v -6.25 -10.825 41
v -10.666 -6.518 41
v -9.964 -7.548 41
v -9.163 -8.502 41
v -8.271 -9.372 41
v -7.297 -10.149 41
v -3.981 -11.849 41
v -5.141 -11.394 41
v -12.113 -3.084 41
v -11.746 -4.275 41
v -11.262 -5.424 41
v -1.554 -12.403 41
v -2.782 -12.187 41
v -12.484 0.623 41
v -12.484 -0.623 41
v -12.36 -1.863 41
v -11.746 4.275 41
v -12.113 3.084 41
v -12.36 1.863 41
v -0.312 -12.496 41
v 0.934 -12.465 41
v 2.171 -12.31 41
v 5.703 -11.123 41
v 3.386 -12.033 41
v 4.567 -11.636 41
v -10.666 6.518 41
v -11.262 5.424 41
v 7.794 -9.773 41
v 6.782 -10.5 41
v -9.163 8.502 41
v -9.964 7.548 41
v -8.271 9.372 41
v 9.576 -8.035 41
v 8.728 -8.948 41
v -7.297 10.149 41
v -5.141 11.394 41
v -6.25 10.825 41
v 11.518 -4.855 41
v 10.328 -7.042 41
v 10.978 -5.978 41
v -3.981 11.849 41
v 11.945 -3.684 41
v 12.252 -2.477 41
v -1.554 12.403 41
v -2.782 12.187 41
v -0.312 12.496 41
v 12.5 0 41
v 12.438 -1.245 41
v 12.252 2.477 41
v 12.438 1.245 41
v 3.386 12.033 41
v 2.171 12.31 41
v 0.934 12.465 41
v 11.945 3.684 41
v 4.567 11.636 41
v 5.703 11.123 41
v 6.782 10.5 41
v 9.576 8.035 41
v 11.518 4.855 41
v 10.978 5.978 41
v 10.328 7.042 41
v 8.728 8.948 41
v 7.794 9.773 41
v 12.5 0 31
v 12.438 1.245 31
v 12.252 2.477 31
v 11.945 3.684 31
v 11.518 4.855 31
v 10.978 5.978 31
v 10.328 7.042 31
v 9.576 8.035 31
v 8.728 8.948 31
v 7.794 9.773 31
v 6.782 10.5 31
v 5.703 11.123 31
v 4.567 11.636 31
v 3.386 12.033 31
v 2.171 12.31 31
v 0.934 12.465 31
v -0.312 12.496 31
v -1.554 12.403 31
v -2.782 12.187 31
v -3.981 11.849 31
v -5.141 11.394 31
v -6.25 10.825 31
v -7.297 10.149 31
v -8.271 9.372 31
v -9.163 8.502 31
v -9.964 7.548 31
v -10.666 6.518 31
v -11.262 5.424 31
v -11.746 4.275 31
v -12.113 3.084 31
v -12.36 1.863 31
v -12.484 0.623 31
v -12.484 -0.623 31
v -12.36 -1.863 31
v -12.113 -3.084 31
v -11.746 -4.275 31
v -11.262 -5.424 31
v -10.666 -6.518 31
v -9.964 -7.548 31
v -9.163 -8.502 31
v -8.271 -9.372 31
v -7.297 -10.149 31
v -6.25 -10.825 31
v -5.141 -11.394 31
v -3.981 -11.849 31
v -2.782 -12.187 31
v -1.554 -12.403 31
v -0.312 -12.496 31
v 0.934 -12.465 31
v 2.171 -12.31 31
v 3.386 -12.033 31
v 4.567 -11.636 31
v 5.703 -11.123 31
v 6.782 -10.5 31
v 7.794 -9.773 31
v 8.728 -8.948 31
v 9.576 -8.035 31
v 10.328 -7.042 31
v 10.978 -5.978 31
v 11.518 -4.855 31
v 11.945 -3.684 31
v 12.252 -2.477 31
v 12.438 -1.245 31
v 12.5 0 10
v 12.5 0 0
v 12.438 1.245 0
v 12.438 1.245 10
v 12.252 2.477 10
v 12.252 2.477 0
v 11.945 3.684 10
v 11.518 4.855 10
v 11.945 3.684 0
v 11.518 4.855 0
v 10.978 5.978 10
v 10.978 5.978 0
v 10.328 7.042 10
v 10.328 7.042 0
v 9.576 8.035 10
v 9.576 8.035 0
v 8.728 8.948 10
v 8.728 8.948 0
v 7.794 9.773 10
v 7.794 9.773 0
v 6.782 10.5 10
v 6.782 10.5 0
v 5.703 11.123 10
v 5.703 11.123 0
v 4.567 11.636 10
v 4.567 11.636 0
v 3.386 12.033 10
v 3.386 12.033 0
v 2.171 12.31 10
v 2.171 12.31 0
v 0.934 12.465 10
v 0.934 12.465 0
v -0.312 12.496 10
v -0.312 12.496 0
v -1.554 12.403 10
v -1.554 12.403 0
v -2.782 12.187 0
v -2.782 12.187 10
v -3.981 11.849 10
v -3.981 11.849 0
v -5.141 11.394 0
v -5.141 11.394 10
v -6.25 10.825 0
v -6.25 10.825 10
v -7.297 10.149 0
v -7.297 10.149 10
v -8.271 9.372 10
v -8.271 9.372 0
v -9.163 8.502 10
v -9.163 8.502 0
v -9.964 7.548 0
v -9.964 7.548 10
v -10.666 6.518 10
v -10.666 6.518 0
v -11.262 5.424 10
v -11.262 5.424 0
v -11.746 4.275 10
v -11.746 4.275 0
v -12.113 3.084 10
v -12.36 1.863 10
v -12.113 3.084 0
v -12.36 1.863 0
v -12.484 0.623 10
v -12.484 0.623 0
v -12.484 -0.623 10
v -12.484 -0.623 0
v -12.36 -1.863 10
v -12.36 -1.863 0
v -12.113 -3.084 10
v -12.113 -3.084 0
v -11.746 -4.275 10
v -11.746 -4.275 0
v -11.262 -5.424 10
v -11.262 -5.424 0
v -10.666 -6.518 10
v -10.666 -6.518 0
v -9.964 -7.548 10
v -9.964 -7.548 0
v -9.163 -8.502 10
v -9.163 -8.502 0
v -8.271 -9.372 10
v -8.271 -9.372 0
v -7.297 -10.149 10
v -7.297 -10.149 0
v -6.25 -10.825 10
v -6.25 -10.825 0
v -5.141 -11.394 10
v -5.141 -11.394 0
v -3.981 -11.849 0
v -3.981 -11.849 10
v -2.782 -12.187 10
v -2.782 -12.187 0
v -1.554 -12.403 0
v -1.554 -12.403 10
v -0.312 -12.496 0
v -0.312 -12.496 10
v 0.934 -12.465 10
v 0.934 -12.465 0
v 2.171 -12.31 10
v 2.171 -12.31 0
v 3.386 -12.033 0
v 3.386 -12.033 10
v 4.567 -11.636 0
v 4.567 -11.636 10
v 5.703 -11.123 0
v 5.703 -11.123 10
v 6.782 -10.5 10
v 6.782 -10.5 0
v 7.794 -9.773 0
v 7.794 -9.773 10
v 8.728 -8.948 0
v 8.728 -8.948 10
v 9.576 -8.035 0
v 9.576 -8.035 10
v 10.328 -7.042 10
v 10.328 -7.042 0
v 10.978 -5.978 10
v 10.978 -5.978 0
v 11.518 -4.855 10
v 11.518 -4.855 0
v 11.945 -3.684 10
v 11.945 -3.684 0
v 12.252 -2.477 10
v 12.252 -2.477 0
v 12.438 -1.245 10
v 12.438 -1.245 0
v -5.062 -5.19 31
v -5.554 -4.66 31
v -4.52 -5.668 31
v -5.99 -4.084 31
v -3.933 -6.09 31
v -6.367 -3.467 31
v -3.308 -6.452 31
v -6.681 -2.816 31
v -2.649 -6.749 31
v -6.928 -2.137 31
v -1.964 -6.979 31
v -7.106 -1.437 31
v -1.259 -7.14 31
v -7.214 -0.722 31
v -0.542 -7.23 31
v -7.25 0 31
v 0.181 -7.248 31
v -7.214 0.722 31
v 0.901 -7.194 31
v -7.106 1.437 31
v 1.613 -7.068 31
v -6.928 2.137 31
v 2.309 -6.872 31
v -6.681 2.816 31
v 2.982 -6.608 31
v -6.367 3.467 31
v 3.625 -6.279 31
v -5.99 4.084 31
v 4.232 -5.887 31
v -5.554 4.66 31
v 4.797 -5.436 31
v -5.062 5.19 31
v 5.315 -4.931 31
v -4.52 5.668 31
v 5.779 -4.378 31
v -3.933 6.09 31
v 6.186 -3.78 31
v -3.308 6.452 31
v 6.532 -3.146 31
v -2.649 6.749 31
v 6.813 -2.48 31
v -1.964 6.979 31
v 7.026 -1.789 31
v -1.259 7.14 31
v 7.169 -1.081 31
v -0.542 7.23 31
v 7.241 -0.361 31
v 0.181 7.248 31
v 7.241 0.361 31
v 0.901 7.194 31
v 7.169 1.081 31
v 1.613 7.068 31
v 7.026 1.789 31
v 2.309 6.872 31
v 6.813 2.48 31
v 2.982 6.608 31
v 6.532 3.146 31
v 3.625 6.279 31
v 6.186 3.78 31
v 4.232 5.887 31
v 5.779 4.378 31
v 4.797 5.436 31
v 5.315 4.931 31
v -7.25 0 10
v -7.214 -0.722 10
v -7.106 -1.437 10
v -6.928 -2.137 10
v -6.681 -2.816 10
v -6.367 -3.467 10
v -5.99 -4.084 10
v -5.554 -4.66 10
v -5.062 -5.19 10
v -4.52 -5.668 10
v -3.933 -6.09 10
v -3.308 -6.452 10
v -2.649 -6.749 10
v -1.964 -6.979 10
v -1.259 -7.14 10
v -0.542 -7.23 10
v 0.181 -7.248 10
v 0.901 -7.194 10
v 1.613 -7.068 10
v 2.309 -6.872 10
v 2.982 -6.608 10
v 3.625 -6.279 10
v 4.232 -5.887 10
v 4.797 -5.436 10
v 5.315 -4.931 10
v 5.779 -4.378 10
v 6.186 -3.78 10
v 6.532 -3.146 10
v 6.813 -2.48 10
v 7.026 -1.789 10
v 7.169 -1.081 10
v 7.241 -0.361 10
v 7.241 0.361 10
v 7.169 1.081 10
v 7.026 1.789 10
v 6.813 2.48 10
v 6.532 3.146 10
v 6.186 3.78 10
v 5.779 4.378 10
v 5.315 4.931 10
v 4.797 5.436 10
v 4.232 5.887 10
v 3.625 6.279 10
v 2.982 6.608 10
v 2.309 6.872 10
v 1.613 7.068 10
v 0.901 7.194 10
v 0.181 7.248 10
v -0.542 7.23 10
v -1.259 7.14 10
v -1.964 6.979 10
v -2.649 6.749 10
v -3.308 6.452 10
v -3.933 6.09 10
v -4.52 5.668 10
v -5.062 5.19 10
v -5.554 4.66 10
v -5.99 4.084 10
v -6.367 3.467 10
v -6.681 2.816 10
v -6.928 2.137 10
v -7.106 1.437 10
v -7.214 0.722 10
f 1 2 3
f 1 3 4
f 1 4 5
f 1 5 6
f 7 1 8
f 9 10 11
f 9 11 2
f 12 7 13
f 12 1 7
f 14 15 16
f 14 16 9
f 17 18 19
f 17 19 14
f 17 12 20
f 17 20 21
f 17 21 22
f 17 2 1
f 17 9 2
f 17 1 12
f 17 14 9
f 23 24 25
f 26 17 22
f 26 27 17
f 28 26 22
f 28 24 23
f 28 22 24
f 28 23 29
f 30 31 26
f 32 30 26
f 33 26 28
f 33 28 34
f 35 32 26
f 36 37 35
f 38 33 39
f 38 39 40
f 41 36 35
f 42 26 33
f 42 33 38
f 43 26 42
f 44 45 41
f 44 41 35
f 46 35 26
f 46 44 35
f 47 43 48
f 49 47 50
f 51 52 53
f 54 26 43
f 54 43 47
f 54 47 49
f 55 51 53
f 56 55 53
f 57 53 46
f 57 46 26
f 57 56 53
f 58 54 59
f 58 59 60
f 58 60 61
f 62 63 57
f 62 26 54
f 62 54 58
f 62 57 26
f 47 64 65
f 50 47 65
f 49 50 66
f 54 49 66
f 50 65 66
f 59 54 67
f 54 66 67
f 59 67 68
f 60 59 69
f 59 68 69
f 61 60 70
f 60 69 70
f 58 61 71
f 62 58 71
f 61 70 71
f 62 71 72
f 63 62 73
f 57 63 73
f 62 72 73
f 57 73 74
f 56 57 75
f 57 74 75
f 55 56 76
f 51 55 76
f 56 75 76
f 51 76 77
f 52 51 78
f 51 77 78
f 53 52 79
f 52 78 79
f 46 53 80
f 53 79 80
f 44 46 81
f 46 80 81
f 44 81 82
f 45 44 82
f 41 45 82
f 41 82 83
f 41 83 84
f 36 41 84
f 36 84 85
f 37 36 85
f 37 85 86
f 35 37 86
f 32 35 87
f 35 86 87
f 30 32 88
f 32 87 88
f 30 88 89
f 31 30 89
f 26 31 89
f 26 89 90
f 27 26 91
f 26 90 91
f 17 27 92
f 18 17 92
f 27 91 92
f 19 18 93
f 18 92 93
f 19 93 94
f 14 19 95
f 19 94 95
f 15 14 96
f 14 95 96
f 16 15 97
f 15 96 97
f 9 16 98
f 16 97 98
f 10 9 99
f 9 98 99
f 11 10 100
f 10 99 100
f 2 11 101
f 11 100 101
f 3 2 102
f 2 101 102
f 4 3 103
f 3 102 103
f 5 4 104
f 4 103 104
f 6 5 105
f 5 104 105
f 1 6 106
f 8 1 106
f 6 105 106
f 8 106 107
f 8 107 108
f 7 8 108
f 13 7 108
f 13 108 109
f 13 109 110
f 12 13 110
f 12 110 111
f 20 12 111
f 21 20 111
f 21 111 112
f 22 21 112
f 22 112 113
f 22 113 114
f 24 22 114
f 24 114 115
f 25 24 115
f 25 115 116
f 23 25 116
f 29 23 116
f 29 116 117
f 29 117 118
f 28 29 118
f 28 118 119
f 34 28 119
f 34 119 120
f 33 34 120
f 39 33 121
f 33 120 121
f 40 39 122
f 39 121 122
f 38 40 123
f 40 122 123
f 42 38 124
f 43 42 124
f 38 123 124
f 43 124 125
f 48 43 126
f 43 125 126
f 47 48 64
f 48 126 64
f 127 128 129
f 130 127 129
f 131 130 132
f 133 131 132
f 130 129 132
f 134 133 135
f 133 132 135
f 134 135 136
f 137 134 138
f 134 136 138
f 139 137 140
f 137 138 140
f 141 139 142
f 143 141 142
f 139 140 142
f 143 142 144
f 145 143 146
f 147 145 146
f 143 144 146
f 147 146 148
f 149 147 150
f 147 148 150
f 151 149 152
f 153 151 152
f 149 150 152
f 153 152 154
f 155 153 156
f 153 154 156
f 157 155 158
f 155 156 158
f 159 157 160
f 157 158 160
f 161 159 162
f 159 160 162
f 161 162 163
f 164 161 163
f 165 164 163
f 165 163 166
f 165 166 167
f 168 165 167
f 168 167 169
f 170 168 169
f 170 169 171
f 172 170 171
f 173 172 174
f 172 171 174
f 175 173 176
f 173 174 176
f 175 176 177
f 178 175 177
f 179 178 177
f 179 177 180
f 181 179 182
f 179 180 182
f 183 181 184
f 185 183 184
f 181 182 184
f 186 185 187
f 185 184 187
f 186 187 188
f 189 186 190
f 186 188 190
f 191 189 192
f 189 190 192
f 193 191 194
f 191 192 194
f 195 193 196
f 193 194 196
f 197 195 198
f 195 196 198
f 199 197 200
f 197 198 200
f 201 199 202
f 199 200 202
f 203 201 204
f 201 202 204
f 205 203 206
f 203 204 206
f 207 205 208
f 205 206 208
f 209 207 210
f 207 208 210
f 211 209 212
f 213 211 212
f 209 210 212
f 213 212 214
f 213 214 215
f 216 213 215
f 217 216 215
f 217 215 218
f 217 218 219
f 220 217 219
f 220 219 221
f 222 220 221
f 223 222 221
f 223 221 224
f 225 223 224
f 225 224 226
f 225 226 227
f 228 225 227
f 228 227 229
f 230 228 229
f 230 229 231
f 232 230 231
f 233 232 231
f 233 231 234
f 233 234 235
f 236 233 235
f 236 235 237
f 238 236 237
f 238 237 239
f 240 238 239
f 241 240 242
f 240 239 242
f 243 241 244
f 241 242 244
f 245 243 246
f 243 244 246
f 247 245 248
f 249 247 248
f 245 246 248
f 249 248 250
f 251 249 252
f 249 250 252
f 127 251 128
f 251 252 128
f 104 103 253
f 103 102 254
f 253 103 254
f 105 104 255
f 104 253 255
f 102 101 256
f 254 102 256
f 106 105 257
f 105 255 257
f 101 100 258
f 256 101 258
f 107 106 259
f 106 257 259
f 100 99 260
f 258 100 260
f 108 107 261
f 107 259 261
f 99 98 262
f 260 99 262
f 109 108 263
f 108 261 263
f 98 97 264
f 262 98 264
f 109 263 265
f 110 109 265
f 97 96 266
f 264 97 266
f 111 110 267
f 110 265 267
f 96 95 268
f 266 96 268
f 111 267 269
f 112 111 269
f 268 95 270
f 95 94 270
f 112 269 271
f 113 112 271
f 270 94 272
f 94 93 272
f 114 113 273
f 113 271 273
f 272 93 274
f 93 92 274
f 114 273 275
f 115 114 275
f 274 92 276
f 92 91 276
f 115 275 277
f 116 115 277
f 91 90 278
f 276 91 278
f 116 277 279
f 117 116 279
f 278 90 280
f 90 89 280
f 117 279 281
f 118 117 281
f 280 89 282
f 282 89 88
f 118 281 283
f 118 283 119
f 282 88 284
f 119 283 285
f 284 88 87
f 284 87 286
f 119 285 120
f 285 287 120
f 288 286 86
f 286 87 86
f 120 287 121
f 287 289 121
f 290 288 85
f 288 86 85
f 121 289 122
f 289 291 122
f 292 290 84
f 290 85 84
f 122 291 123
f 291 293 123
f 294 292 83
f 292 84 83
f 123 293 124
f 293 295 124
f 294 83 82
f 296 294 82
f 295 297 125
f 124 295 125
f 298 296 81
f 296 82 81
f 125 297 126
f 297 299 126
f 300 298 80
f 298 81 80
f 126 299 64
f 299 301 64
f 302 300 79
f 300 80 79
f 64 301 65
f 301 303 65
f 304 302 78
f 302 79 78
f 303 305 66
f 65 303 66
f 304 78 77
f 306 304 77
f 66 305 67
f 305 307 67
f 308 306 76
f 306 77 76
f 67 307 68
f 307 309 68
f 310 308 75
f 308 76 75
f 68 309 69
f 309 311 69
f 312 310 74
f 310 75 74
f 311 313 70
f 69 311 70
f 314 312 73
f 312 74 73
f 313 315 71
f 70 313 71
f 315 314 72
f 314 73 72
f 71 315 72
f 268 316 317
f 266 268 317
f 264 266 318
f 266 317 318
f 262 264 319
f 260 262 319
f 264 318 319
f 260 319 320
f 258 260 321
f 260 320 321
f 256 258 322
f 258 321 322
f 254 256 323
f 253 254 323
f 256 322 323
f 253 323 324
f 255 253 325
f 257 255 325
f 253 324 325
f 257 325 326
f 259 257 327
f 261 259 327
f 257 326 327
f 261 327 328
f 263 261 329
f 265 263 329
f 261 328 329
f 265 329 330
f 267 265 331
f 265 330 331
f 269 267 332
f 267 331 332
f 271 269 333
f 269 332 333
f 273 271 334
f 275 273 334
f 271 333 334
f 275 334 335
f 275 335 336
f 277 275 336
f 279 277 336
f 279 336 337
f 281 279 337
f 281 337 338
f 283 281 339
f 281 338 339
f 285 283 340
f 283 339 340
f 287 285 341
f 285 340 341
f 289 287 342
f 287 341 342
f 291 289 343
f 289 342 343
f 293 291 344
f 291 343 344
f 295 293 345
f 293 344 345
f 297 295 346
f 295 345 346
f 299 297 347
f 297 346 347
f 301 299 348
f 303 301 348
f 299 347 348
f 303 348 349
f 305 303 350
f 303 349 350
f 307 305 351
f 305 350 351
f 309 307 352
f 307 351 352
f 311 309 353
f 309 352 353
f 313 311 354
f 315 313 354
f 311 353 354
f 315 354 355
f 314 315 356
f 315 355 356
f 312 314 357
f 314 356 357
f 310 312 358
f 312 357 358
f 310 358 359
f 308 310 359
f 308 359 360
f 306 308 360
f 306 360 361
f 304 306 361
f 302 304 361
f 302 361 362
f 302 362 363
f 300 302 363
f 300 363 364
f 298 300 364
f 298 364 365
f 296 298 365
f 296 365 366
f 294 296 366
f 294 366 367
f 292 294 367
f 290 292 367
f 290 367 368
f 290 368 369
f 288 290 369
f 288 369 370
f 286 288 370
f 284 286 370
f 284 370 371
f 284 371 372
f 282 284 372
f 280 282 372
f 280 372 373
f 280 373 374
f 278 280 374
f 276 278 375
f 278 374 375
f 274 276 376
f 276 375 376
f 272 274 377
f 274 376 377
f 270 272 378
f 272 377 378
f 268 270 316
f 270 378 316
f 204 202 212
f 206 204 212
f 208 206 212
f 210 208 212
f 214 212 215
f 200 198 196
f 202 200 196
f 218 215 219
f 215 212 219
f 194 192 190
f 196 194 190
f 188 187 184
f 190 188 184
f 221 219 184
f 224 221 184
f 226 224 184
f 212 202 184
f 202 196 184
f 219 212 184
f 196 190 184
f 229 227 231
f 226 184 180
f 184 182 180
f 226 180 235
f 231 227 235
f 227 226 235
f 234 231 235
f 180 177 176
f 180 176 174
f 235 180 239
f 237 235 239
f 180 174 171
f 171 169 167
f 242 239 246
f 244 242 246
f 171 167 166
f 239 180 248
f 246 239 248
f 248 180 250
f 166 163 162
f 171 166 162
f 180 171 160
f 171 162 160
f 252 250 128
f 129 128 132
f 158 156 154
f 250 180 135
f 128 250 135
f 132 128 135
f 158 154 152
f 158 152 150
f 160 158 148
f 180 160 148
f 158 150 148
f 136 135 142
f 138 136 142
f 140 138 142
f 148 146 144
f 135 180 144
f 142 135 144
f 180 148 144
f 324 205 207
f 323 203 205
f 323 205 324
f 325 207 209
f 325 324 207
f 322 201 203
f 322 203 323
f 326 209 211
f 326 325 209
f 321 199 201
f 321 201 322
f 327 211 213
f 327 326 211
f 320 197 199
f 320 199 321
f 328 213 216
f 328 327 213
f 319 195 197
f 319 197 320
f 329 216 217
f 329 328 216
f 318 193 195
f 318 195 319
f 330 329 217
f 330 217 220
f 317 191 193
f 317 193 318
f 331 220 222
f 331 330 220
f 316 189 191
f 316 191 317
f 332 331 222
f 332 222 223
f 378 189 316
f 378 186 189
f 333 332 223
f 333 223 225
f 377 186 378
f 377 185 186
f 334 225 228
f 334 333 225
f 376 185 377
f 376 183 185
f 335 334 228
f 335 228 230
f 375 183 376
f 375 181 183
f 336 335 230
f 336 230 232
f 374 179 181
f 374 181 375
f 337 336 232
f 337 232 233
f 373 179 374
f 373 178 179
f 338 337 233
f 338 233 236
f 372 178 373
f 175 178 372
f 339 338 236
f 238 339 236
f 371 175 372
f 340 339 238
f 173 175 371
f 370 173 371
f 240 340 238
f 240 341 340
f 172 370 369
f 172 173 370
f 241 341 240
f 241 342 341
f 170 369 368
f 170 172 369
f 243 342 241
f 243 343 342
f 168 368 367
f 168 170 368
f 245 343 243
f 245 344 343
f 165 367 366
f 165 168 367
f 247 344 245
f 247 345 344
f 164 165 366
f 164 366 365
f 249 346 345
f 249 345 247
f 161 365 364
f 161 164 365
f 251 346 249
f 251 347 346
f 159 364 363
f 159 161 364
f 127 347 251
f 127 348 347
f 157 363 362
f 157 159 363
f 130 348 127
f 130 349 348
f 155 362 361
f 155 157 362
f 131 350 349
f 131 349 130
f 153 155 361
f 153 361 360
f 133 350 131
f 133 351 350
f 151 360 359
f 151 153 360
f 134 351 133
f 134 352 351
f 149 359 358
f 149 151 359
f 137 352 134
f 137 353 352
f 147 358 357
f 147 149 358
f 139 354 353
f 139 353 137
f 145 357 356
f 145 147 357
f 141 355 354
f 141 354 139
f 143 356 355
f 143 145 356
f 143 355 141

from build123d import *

# Parameters (mm, degrees)
SKETCH1_R           = 12.5
BOSS_EXTRUDE1_DEPTH = 10
SKETCH3_R           = 7.25
BOSS_EXTRUDE2_DEPTH = 21
SKETCH4_R           = 12.5
BOSS_EXTRUDE3_DEPTH = 10


with BuildPart() as part:
    # Sketch1 → Boss-Extrude1 (new body)
    with BuildSketch(Plane.XY):
        Circle(SKETCH1_R)
    extrude(amount=BOSS_EXTRUDE1_DEPTH)

    # Sketch3 → Boss-Extrude2 (add)
    with BuildSketch(Plane.XY.offset(10)):
        with Locations(Location((0, 0, 0), (0, 0, 180))):
            Circle(SKETCH3_R)
    extrude(amount=BOSS_EXTRUDE2_DEPTH)

    # Sketch4 → Boss-Extrude3 (add)
    with BuildSketch(Plane.XY.offset(31)):
        Circle(SKETCH4_R)
    extrude(amount=BOSS_EXTRUDE3_DEPTH)


solid = part.part
